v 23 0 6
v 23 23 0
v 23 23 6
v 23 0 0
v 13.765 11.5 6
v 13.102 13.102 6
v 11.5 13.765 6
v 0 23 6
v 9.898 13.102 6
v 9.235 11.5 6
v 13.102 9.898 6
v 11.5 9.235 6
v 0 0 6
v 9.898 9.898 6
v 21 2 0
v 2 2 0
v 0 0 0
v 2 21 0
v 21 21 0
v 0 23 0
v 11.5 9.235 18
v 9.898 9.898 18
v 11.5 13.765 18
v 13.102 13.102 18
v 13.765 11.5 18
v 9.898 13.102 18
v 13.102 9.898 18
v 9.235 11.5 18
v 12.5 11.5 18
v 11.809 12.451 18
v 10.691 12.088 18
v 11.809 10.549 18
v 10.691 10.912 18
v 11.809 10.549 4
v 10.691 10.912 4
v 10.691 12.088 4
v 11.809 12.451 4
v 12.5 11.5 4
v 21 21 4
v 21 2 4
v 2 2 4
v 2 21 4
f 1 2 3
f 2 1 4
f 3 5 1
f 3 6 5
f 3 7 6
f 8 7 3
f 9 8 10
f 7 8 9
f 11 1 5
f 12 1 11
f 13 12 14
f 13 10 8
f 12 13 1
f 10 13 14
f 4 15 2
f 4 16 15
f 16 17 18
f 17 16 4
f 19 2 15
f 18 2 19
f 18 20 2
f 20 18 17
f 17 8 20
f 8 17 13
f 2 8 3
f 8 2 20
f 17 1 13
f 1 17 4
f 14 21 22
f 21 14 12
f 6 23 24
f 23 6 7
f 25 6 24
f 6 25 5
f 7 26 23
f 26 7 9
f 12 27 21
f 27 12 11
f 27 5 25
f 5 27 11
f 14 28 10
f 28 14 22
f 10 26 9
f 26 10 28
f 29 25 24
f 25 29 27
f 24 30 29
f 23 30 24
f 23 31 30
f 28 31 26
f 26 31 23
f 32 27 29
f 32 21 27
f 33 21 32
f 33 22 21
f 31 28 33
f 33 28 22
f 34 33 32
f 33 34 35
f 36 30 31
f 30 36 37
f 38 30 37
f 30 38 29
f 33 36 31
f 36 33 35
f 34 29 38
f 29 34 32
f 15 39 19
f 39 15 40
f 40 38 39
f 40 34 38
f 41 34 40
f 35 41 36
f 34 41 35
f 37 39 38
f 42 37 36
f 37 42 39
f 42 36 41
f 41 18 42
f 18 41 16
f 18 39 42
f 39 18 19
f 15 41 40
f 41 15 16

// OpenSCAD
module actual_plus_inner(){
difference(){

    translate([19/2,19/2,4/2]){
        cube([17.6,17.96,2.5],center = true);
        %cube([19,19,4],center=true);
        

    difference(){
        translate([0,0,1.8])cylinder(r=2.42/2,h=12);
        cylinder(r=2/2,h=20);
        }
    }
 }
}
 
difference() {   
    union() {
    cube([23,23,6]);
     translate([23/2,23/2,6-0.1])               
        translate([0,0,.1])cylinder(r=4.53 /2,h=12);
    }

    translate([23/2,23/2,6-0.1])
           translate([0,0,-10])cylinder(r=2/2,h=30);
    translate([2,2,-0.1]) cube([19,19,4.1]);
}
    
